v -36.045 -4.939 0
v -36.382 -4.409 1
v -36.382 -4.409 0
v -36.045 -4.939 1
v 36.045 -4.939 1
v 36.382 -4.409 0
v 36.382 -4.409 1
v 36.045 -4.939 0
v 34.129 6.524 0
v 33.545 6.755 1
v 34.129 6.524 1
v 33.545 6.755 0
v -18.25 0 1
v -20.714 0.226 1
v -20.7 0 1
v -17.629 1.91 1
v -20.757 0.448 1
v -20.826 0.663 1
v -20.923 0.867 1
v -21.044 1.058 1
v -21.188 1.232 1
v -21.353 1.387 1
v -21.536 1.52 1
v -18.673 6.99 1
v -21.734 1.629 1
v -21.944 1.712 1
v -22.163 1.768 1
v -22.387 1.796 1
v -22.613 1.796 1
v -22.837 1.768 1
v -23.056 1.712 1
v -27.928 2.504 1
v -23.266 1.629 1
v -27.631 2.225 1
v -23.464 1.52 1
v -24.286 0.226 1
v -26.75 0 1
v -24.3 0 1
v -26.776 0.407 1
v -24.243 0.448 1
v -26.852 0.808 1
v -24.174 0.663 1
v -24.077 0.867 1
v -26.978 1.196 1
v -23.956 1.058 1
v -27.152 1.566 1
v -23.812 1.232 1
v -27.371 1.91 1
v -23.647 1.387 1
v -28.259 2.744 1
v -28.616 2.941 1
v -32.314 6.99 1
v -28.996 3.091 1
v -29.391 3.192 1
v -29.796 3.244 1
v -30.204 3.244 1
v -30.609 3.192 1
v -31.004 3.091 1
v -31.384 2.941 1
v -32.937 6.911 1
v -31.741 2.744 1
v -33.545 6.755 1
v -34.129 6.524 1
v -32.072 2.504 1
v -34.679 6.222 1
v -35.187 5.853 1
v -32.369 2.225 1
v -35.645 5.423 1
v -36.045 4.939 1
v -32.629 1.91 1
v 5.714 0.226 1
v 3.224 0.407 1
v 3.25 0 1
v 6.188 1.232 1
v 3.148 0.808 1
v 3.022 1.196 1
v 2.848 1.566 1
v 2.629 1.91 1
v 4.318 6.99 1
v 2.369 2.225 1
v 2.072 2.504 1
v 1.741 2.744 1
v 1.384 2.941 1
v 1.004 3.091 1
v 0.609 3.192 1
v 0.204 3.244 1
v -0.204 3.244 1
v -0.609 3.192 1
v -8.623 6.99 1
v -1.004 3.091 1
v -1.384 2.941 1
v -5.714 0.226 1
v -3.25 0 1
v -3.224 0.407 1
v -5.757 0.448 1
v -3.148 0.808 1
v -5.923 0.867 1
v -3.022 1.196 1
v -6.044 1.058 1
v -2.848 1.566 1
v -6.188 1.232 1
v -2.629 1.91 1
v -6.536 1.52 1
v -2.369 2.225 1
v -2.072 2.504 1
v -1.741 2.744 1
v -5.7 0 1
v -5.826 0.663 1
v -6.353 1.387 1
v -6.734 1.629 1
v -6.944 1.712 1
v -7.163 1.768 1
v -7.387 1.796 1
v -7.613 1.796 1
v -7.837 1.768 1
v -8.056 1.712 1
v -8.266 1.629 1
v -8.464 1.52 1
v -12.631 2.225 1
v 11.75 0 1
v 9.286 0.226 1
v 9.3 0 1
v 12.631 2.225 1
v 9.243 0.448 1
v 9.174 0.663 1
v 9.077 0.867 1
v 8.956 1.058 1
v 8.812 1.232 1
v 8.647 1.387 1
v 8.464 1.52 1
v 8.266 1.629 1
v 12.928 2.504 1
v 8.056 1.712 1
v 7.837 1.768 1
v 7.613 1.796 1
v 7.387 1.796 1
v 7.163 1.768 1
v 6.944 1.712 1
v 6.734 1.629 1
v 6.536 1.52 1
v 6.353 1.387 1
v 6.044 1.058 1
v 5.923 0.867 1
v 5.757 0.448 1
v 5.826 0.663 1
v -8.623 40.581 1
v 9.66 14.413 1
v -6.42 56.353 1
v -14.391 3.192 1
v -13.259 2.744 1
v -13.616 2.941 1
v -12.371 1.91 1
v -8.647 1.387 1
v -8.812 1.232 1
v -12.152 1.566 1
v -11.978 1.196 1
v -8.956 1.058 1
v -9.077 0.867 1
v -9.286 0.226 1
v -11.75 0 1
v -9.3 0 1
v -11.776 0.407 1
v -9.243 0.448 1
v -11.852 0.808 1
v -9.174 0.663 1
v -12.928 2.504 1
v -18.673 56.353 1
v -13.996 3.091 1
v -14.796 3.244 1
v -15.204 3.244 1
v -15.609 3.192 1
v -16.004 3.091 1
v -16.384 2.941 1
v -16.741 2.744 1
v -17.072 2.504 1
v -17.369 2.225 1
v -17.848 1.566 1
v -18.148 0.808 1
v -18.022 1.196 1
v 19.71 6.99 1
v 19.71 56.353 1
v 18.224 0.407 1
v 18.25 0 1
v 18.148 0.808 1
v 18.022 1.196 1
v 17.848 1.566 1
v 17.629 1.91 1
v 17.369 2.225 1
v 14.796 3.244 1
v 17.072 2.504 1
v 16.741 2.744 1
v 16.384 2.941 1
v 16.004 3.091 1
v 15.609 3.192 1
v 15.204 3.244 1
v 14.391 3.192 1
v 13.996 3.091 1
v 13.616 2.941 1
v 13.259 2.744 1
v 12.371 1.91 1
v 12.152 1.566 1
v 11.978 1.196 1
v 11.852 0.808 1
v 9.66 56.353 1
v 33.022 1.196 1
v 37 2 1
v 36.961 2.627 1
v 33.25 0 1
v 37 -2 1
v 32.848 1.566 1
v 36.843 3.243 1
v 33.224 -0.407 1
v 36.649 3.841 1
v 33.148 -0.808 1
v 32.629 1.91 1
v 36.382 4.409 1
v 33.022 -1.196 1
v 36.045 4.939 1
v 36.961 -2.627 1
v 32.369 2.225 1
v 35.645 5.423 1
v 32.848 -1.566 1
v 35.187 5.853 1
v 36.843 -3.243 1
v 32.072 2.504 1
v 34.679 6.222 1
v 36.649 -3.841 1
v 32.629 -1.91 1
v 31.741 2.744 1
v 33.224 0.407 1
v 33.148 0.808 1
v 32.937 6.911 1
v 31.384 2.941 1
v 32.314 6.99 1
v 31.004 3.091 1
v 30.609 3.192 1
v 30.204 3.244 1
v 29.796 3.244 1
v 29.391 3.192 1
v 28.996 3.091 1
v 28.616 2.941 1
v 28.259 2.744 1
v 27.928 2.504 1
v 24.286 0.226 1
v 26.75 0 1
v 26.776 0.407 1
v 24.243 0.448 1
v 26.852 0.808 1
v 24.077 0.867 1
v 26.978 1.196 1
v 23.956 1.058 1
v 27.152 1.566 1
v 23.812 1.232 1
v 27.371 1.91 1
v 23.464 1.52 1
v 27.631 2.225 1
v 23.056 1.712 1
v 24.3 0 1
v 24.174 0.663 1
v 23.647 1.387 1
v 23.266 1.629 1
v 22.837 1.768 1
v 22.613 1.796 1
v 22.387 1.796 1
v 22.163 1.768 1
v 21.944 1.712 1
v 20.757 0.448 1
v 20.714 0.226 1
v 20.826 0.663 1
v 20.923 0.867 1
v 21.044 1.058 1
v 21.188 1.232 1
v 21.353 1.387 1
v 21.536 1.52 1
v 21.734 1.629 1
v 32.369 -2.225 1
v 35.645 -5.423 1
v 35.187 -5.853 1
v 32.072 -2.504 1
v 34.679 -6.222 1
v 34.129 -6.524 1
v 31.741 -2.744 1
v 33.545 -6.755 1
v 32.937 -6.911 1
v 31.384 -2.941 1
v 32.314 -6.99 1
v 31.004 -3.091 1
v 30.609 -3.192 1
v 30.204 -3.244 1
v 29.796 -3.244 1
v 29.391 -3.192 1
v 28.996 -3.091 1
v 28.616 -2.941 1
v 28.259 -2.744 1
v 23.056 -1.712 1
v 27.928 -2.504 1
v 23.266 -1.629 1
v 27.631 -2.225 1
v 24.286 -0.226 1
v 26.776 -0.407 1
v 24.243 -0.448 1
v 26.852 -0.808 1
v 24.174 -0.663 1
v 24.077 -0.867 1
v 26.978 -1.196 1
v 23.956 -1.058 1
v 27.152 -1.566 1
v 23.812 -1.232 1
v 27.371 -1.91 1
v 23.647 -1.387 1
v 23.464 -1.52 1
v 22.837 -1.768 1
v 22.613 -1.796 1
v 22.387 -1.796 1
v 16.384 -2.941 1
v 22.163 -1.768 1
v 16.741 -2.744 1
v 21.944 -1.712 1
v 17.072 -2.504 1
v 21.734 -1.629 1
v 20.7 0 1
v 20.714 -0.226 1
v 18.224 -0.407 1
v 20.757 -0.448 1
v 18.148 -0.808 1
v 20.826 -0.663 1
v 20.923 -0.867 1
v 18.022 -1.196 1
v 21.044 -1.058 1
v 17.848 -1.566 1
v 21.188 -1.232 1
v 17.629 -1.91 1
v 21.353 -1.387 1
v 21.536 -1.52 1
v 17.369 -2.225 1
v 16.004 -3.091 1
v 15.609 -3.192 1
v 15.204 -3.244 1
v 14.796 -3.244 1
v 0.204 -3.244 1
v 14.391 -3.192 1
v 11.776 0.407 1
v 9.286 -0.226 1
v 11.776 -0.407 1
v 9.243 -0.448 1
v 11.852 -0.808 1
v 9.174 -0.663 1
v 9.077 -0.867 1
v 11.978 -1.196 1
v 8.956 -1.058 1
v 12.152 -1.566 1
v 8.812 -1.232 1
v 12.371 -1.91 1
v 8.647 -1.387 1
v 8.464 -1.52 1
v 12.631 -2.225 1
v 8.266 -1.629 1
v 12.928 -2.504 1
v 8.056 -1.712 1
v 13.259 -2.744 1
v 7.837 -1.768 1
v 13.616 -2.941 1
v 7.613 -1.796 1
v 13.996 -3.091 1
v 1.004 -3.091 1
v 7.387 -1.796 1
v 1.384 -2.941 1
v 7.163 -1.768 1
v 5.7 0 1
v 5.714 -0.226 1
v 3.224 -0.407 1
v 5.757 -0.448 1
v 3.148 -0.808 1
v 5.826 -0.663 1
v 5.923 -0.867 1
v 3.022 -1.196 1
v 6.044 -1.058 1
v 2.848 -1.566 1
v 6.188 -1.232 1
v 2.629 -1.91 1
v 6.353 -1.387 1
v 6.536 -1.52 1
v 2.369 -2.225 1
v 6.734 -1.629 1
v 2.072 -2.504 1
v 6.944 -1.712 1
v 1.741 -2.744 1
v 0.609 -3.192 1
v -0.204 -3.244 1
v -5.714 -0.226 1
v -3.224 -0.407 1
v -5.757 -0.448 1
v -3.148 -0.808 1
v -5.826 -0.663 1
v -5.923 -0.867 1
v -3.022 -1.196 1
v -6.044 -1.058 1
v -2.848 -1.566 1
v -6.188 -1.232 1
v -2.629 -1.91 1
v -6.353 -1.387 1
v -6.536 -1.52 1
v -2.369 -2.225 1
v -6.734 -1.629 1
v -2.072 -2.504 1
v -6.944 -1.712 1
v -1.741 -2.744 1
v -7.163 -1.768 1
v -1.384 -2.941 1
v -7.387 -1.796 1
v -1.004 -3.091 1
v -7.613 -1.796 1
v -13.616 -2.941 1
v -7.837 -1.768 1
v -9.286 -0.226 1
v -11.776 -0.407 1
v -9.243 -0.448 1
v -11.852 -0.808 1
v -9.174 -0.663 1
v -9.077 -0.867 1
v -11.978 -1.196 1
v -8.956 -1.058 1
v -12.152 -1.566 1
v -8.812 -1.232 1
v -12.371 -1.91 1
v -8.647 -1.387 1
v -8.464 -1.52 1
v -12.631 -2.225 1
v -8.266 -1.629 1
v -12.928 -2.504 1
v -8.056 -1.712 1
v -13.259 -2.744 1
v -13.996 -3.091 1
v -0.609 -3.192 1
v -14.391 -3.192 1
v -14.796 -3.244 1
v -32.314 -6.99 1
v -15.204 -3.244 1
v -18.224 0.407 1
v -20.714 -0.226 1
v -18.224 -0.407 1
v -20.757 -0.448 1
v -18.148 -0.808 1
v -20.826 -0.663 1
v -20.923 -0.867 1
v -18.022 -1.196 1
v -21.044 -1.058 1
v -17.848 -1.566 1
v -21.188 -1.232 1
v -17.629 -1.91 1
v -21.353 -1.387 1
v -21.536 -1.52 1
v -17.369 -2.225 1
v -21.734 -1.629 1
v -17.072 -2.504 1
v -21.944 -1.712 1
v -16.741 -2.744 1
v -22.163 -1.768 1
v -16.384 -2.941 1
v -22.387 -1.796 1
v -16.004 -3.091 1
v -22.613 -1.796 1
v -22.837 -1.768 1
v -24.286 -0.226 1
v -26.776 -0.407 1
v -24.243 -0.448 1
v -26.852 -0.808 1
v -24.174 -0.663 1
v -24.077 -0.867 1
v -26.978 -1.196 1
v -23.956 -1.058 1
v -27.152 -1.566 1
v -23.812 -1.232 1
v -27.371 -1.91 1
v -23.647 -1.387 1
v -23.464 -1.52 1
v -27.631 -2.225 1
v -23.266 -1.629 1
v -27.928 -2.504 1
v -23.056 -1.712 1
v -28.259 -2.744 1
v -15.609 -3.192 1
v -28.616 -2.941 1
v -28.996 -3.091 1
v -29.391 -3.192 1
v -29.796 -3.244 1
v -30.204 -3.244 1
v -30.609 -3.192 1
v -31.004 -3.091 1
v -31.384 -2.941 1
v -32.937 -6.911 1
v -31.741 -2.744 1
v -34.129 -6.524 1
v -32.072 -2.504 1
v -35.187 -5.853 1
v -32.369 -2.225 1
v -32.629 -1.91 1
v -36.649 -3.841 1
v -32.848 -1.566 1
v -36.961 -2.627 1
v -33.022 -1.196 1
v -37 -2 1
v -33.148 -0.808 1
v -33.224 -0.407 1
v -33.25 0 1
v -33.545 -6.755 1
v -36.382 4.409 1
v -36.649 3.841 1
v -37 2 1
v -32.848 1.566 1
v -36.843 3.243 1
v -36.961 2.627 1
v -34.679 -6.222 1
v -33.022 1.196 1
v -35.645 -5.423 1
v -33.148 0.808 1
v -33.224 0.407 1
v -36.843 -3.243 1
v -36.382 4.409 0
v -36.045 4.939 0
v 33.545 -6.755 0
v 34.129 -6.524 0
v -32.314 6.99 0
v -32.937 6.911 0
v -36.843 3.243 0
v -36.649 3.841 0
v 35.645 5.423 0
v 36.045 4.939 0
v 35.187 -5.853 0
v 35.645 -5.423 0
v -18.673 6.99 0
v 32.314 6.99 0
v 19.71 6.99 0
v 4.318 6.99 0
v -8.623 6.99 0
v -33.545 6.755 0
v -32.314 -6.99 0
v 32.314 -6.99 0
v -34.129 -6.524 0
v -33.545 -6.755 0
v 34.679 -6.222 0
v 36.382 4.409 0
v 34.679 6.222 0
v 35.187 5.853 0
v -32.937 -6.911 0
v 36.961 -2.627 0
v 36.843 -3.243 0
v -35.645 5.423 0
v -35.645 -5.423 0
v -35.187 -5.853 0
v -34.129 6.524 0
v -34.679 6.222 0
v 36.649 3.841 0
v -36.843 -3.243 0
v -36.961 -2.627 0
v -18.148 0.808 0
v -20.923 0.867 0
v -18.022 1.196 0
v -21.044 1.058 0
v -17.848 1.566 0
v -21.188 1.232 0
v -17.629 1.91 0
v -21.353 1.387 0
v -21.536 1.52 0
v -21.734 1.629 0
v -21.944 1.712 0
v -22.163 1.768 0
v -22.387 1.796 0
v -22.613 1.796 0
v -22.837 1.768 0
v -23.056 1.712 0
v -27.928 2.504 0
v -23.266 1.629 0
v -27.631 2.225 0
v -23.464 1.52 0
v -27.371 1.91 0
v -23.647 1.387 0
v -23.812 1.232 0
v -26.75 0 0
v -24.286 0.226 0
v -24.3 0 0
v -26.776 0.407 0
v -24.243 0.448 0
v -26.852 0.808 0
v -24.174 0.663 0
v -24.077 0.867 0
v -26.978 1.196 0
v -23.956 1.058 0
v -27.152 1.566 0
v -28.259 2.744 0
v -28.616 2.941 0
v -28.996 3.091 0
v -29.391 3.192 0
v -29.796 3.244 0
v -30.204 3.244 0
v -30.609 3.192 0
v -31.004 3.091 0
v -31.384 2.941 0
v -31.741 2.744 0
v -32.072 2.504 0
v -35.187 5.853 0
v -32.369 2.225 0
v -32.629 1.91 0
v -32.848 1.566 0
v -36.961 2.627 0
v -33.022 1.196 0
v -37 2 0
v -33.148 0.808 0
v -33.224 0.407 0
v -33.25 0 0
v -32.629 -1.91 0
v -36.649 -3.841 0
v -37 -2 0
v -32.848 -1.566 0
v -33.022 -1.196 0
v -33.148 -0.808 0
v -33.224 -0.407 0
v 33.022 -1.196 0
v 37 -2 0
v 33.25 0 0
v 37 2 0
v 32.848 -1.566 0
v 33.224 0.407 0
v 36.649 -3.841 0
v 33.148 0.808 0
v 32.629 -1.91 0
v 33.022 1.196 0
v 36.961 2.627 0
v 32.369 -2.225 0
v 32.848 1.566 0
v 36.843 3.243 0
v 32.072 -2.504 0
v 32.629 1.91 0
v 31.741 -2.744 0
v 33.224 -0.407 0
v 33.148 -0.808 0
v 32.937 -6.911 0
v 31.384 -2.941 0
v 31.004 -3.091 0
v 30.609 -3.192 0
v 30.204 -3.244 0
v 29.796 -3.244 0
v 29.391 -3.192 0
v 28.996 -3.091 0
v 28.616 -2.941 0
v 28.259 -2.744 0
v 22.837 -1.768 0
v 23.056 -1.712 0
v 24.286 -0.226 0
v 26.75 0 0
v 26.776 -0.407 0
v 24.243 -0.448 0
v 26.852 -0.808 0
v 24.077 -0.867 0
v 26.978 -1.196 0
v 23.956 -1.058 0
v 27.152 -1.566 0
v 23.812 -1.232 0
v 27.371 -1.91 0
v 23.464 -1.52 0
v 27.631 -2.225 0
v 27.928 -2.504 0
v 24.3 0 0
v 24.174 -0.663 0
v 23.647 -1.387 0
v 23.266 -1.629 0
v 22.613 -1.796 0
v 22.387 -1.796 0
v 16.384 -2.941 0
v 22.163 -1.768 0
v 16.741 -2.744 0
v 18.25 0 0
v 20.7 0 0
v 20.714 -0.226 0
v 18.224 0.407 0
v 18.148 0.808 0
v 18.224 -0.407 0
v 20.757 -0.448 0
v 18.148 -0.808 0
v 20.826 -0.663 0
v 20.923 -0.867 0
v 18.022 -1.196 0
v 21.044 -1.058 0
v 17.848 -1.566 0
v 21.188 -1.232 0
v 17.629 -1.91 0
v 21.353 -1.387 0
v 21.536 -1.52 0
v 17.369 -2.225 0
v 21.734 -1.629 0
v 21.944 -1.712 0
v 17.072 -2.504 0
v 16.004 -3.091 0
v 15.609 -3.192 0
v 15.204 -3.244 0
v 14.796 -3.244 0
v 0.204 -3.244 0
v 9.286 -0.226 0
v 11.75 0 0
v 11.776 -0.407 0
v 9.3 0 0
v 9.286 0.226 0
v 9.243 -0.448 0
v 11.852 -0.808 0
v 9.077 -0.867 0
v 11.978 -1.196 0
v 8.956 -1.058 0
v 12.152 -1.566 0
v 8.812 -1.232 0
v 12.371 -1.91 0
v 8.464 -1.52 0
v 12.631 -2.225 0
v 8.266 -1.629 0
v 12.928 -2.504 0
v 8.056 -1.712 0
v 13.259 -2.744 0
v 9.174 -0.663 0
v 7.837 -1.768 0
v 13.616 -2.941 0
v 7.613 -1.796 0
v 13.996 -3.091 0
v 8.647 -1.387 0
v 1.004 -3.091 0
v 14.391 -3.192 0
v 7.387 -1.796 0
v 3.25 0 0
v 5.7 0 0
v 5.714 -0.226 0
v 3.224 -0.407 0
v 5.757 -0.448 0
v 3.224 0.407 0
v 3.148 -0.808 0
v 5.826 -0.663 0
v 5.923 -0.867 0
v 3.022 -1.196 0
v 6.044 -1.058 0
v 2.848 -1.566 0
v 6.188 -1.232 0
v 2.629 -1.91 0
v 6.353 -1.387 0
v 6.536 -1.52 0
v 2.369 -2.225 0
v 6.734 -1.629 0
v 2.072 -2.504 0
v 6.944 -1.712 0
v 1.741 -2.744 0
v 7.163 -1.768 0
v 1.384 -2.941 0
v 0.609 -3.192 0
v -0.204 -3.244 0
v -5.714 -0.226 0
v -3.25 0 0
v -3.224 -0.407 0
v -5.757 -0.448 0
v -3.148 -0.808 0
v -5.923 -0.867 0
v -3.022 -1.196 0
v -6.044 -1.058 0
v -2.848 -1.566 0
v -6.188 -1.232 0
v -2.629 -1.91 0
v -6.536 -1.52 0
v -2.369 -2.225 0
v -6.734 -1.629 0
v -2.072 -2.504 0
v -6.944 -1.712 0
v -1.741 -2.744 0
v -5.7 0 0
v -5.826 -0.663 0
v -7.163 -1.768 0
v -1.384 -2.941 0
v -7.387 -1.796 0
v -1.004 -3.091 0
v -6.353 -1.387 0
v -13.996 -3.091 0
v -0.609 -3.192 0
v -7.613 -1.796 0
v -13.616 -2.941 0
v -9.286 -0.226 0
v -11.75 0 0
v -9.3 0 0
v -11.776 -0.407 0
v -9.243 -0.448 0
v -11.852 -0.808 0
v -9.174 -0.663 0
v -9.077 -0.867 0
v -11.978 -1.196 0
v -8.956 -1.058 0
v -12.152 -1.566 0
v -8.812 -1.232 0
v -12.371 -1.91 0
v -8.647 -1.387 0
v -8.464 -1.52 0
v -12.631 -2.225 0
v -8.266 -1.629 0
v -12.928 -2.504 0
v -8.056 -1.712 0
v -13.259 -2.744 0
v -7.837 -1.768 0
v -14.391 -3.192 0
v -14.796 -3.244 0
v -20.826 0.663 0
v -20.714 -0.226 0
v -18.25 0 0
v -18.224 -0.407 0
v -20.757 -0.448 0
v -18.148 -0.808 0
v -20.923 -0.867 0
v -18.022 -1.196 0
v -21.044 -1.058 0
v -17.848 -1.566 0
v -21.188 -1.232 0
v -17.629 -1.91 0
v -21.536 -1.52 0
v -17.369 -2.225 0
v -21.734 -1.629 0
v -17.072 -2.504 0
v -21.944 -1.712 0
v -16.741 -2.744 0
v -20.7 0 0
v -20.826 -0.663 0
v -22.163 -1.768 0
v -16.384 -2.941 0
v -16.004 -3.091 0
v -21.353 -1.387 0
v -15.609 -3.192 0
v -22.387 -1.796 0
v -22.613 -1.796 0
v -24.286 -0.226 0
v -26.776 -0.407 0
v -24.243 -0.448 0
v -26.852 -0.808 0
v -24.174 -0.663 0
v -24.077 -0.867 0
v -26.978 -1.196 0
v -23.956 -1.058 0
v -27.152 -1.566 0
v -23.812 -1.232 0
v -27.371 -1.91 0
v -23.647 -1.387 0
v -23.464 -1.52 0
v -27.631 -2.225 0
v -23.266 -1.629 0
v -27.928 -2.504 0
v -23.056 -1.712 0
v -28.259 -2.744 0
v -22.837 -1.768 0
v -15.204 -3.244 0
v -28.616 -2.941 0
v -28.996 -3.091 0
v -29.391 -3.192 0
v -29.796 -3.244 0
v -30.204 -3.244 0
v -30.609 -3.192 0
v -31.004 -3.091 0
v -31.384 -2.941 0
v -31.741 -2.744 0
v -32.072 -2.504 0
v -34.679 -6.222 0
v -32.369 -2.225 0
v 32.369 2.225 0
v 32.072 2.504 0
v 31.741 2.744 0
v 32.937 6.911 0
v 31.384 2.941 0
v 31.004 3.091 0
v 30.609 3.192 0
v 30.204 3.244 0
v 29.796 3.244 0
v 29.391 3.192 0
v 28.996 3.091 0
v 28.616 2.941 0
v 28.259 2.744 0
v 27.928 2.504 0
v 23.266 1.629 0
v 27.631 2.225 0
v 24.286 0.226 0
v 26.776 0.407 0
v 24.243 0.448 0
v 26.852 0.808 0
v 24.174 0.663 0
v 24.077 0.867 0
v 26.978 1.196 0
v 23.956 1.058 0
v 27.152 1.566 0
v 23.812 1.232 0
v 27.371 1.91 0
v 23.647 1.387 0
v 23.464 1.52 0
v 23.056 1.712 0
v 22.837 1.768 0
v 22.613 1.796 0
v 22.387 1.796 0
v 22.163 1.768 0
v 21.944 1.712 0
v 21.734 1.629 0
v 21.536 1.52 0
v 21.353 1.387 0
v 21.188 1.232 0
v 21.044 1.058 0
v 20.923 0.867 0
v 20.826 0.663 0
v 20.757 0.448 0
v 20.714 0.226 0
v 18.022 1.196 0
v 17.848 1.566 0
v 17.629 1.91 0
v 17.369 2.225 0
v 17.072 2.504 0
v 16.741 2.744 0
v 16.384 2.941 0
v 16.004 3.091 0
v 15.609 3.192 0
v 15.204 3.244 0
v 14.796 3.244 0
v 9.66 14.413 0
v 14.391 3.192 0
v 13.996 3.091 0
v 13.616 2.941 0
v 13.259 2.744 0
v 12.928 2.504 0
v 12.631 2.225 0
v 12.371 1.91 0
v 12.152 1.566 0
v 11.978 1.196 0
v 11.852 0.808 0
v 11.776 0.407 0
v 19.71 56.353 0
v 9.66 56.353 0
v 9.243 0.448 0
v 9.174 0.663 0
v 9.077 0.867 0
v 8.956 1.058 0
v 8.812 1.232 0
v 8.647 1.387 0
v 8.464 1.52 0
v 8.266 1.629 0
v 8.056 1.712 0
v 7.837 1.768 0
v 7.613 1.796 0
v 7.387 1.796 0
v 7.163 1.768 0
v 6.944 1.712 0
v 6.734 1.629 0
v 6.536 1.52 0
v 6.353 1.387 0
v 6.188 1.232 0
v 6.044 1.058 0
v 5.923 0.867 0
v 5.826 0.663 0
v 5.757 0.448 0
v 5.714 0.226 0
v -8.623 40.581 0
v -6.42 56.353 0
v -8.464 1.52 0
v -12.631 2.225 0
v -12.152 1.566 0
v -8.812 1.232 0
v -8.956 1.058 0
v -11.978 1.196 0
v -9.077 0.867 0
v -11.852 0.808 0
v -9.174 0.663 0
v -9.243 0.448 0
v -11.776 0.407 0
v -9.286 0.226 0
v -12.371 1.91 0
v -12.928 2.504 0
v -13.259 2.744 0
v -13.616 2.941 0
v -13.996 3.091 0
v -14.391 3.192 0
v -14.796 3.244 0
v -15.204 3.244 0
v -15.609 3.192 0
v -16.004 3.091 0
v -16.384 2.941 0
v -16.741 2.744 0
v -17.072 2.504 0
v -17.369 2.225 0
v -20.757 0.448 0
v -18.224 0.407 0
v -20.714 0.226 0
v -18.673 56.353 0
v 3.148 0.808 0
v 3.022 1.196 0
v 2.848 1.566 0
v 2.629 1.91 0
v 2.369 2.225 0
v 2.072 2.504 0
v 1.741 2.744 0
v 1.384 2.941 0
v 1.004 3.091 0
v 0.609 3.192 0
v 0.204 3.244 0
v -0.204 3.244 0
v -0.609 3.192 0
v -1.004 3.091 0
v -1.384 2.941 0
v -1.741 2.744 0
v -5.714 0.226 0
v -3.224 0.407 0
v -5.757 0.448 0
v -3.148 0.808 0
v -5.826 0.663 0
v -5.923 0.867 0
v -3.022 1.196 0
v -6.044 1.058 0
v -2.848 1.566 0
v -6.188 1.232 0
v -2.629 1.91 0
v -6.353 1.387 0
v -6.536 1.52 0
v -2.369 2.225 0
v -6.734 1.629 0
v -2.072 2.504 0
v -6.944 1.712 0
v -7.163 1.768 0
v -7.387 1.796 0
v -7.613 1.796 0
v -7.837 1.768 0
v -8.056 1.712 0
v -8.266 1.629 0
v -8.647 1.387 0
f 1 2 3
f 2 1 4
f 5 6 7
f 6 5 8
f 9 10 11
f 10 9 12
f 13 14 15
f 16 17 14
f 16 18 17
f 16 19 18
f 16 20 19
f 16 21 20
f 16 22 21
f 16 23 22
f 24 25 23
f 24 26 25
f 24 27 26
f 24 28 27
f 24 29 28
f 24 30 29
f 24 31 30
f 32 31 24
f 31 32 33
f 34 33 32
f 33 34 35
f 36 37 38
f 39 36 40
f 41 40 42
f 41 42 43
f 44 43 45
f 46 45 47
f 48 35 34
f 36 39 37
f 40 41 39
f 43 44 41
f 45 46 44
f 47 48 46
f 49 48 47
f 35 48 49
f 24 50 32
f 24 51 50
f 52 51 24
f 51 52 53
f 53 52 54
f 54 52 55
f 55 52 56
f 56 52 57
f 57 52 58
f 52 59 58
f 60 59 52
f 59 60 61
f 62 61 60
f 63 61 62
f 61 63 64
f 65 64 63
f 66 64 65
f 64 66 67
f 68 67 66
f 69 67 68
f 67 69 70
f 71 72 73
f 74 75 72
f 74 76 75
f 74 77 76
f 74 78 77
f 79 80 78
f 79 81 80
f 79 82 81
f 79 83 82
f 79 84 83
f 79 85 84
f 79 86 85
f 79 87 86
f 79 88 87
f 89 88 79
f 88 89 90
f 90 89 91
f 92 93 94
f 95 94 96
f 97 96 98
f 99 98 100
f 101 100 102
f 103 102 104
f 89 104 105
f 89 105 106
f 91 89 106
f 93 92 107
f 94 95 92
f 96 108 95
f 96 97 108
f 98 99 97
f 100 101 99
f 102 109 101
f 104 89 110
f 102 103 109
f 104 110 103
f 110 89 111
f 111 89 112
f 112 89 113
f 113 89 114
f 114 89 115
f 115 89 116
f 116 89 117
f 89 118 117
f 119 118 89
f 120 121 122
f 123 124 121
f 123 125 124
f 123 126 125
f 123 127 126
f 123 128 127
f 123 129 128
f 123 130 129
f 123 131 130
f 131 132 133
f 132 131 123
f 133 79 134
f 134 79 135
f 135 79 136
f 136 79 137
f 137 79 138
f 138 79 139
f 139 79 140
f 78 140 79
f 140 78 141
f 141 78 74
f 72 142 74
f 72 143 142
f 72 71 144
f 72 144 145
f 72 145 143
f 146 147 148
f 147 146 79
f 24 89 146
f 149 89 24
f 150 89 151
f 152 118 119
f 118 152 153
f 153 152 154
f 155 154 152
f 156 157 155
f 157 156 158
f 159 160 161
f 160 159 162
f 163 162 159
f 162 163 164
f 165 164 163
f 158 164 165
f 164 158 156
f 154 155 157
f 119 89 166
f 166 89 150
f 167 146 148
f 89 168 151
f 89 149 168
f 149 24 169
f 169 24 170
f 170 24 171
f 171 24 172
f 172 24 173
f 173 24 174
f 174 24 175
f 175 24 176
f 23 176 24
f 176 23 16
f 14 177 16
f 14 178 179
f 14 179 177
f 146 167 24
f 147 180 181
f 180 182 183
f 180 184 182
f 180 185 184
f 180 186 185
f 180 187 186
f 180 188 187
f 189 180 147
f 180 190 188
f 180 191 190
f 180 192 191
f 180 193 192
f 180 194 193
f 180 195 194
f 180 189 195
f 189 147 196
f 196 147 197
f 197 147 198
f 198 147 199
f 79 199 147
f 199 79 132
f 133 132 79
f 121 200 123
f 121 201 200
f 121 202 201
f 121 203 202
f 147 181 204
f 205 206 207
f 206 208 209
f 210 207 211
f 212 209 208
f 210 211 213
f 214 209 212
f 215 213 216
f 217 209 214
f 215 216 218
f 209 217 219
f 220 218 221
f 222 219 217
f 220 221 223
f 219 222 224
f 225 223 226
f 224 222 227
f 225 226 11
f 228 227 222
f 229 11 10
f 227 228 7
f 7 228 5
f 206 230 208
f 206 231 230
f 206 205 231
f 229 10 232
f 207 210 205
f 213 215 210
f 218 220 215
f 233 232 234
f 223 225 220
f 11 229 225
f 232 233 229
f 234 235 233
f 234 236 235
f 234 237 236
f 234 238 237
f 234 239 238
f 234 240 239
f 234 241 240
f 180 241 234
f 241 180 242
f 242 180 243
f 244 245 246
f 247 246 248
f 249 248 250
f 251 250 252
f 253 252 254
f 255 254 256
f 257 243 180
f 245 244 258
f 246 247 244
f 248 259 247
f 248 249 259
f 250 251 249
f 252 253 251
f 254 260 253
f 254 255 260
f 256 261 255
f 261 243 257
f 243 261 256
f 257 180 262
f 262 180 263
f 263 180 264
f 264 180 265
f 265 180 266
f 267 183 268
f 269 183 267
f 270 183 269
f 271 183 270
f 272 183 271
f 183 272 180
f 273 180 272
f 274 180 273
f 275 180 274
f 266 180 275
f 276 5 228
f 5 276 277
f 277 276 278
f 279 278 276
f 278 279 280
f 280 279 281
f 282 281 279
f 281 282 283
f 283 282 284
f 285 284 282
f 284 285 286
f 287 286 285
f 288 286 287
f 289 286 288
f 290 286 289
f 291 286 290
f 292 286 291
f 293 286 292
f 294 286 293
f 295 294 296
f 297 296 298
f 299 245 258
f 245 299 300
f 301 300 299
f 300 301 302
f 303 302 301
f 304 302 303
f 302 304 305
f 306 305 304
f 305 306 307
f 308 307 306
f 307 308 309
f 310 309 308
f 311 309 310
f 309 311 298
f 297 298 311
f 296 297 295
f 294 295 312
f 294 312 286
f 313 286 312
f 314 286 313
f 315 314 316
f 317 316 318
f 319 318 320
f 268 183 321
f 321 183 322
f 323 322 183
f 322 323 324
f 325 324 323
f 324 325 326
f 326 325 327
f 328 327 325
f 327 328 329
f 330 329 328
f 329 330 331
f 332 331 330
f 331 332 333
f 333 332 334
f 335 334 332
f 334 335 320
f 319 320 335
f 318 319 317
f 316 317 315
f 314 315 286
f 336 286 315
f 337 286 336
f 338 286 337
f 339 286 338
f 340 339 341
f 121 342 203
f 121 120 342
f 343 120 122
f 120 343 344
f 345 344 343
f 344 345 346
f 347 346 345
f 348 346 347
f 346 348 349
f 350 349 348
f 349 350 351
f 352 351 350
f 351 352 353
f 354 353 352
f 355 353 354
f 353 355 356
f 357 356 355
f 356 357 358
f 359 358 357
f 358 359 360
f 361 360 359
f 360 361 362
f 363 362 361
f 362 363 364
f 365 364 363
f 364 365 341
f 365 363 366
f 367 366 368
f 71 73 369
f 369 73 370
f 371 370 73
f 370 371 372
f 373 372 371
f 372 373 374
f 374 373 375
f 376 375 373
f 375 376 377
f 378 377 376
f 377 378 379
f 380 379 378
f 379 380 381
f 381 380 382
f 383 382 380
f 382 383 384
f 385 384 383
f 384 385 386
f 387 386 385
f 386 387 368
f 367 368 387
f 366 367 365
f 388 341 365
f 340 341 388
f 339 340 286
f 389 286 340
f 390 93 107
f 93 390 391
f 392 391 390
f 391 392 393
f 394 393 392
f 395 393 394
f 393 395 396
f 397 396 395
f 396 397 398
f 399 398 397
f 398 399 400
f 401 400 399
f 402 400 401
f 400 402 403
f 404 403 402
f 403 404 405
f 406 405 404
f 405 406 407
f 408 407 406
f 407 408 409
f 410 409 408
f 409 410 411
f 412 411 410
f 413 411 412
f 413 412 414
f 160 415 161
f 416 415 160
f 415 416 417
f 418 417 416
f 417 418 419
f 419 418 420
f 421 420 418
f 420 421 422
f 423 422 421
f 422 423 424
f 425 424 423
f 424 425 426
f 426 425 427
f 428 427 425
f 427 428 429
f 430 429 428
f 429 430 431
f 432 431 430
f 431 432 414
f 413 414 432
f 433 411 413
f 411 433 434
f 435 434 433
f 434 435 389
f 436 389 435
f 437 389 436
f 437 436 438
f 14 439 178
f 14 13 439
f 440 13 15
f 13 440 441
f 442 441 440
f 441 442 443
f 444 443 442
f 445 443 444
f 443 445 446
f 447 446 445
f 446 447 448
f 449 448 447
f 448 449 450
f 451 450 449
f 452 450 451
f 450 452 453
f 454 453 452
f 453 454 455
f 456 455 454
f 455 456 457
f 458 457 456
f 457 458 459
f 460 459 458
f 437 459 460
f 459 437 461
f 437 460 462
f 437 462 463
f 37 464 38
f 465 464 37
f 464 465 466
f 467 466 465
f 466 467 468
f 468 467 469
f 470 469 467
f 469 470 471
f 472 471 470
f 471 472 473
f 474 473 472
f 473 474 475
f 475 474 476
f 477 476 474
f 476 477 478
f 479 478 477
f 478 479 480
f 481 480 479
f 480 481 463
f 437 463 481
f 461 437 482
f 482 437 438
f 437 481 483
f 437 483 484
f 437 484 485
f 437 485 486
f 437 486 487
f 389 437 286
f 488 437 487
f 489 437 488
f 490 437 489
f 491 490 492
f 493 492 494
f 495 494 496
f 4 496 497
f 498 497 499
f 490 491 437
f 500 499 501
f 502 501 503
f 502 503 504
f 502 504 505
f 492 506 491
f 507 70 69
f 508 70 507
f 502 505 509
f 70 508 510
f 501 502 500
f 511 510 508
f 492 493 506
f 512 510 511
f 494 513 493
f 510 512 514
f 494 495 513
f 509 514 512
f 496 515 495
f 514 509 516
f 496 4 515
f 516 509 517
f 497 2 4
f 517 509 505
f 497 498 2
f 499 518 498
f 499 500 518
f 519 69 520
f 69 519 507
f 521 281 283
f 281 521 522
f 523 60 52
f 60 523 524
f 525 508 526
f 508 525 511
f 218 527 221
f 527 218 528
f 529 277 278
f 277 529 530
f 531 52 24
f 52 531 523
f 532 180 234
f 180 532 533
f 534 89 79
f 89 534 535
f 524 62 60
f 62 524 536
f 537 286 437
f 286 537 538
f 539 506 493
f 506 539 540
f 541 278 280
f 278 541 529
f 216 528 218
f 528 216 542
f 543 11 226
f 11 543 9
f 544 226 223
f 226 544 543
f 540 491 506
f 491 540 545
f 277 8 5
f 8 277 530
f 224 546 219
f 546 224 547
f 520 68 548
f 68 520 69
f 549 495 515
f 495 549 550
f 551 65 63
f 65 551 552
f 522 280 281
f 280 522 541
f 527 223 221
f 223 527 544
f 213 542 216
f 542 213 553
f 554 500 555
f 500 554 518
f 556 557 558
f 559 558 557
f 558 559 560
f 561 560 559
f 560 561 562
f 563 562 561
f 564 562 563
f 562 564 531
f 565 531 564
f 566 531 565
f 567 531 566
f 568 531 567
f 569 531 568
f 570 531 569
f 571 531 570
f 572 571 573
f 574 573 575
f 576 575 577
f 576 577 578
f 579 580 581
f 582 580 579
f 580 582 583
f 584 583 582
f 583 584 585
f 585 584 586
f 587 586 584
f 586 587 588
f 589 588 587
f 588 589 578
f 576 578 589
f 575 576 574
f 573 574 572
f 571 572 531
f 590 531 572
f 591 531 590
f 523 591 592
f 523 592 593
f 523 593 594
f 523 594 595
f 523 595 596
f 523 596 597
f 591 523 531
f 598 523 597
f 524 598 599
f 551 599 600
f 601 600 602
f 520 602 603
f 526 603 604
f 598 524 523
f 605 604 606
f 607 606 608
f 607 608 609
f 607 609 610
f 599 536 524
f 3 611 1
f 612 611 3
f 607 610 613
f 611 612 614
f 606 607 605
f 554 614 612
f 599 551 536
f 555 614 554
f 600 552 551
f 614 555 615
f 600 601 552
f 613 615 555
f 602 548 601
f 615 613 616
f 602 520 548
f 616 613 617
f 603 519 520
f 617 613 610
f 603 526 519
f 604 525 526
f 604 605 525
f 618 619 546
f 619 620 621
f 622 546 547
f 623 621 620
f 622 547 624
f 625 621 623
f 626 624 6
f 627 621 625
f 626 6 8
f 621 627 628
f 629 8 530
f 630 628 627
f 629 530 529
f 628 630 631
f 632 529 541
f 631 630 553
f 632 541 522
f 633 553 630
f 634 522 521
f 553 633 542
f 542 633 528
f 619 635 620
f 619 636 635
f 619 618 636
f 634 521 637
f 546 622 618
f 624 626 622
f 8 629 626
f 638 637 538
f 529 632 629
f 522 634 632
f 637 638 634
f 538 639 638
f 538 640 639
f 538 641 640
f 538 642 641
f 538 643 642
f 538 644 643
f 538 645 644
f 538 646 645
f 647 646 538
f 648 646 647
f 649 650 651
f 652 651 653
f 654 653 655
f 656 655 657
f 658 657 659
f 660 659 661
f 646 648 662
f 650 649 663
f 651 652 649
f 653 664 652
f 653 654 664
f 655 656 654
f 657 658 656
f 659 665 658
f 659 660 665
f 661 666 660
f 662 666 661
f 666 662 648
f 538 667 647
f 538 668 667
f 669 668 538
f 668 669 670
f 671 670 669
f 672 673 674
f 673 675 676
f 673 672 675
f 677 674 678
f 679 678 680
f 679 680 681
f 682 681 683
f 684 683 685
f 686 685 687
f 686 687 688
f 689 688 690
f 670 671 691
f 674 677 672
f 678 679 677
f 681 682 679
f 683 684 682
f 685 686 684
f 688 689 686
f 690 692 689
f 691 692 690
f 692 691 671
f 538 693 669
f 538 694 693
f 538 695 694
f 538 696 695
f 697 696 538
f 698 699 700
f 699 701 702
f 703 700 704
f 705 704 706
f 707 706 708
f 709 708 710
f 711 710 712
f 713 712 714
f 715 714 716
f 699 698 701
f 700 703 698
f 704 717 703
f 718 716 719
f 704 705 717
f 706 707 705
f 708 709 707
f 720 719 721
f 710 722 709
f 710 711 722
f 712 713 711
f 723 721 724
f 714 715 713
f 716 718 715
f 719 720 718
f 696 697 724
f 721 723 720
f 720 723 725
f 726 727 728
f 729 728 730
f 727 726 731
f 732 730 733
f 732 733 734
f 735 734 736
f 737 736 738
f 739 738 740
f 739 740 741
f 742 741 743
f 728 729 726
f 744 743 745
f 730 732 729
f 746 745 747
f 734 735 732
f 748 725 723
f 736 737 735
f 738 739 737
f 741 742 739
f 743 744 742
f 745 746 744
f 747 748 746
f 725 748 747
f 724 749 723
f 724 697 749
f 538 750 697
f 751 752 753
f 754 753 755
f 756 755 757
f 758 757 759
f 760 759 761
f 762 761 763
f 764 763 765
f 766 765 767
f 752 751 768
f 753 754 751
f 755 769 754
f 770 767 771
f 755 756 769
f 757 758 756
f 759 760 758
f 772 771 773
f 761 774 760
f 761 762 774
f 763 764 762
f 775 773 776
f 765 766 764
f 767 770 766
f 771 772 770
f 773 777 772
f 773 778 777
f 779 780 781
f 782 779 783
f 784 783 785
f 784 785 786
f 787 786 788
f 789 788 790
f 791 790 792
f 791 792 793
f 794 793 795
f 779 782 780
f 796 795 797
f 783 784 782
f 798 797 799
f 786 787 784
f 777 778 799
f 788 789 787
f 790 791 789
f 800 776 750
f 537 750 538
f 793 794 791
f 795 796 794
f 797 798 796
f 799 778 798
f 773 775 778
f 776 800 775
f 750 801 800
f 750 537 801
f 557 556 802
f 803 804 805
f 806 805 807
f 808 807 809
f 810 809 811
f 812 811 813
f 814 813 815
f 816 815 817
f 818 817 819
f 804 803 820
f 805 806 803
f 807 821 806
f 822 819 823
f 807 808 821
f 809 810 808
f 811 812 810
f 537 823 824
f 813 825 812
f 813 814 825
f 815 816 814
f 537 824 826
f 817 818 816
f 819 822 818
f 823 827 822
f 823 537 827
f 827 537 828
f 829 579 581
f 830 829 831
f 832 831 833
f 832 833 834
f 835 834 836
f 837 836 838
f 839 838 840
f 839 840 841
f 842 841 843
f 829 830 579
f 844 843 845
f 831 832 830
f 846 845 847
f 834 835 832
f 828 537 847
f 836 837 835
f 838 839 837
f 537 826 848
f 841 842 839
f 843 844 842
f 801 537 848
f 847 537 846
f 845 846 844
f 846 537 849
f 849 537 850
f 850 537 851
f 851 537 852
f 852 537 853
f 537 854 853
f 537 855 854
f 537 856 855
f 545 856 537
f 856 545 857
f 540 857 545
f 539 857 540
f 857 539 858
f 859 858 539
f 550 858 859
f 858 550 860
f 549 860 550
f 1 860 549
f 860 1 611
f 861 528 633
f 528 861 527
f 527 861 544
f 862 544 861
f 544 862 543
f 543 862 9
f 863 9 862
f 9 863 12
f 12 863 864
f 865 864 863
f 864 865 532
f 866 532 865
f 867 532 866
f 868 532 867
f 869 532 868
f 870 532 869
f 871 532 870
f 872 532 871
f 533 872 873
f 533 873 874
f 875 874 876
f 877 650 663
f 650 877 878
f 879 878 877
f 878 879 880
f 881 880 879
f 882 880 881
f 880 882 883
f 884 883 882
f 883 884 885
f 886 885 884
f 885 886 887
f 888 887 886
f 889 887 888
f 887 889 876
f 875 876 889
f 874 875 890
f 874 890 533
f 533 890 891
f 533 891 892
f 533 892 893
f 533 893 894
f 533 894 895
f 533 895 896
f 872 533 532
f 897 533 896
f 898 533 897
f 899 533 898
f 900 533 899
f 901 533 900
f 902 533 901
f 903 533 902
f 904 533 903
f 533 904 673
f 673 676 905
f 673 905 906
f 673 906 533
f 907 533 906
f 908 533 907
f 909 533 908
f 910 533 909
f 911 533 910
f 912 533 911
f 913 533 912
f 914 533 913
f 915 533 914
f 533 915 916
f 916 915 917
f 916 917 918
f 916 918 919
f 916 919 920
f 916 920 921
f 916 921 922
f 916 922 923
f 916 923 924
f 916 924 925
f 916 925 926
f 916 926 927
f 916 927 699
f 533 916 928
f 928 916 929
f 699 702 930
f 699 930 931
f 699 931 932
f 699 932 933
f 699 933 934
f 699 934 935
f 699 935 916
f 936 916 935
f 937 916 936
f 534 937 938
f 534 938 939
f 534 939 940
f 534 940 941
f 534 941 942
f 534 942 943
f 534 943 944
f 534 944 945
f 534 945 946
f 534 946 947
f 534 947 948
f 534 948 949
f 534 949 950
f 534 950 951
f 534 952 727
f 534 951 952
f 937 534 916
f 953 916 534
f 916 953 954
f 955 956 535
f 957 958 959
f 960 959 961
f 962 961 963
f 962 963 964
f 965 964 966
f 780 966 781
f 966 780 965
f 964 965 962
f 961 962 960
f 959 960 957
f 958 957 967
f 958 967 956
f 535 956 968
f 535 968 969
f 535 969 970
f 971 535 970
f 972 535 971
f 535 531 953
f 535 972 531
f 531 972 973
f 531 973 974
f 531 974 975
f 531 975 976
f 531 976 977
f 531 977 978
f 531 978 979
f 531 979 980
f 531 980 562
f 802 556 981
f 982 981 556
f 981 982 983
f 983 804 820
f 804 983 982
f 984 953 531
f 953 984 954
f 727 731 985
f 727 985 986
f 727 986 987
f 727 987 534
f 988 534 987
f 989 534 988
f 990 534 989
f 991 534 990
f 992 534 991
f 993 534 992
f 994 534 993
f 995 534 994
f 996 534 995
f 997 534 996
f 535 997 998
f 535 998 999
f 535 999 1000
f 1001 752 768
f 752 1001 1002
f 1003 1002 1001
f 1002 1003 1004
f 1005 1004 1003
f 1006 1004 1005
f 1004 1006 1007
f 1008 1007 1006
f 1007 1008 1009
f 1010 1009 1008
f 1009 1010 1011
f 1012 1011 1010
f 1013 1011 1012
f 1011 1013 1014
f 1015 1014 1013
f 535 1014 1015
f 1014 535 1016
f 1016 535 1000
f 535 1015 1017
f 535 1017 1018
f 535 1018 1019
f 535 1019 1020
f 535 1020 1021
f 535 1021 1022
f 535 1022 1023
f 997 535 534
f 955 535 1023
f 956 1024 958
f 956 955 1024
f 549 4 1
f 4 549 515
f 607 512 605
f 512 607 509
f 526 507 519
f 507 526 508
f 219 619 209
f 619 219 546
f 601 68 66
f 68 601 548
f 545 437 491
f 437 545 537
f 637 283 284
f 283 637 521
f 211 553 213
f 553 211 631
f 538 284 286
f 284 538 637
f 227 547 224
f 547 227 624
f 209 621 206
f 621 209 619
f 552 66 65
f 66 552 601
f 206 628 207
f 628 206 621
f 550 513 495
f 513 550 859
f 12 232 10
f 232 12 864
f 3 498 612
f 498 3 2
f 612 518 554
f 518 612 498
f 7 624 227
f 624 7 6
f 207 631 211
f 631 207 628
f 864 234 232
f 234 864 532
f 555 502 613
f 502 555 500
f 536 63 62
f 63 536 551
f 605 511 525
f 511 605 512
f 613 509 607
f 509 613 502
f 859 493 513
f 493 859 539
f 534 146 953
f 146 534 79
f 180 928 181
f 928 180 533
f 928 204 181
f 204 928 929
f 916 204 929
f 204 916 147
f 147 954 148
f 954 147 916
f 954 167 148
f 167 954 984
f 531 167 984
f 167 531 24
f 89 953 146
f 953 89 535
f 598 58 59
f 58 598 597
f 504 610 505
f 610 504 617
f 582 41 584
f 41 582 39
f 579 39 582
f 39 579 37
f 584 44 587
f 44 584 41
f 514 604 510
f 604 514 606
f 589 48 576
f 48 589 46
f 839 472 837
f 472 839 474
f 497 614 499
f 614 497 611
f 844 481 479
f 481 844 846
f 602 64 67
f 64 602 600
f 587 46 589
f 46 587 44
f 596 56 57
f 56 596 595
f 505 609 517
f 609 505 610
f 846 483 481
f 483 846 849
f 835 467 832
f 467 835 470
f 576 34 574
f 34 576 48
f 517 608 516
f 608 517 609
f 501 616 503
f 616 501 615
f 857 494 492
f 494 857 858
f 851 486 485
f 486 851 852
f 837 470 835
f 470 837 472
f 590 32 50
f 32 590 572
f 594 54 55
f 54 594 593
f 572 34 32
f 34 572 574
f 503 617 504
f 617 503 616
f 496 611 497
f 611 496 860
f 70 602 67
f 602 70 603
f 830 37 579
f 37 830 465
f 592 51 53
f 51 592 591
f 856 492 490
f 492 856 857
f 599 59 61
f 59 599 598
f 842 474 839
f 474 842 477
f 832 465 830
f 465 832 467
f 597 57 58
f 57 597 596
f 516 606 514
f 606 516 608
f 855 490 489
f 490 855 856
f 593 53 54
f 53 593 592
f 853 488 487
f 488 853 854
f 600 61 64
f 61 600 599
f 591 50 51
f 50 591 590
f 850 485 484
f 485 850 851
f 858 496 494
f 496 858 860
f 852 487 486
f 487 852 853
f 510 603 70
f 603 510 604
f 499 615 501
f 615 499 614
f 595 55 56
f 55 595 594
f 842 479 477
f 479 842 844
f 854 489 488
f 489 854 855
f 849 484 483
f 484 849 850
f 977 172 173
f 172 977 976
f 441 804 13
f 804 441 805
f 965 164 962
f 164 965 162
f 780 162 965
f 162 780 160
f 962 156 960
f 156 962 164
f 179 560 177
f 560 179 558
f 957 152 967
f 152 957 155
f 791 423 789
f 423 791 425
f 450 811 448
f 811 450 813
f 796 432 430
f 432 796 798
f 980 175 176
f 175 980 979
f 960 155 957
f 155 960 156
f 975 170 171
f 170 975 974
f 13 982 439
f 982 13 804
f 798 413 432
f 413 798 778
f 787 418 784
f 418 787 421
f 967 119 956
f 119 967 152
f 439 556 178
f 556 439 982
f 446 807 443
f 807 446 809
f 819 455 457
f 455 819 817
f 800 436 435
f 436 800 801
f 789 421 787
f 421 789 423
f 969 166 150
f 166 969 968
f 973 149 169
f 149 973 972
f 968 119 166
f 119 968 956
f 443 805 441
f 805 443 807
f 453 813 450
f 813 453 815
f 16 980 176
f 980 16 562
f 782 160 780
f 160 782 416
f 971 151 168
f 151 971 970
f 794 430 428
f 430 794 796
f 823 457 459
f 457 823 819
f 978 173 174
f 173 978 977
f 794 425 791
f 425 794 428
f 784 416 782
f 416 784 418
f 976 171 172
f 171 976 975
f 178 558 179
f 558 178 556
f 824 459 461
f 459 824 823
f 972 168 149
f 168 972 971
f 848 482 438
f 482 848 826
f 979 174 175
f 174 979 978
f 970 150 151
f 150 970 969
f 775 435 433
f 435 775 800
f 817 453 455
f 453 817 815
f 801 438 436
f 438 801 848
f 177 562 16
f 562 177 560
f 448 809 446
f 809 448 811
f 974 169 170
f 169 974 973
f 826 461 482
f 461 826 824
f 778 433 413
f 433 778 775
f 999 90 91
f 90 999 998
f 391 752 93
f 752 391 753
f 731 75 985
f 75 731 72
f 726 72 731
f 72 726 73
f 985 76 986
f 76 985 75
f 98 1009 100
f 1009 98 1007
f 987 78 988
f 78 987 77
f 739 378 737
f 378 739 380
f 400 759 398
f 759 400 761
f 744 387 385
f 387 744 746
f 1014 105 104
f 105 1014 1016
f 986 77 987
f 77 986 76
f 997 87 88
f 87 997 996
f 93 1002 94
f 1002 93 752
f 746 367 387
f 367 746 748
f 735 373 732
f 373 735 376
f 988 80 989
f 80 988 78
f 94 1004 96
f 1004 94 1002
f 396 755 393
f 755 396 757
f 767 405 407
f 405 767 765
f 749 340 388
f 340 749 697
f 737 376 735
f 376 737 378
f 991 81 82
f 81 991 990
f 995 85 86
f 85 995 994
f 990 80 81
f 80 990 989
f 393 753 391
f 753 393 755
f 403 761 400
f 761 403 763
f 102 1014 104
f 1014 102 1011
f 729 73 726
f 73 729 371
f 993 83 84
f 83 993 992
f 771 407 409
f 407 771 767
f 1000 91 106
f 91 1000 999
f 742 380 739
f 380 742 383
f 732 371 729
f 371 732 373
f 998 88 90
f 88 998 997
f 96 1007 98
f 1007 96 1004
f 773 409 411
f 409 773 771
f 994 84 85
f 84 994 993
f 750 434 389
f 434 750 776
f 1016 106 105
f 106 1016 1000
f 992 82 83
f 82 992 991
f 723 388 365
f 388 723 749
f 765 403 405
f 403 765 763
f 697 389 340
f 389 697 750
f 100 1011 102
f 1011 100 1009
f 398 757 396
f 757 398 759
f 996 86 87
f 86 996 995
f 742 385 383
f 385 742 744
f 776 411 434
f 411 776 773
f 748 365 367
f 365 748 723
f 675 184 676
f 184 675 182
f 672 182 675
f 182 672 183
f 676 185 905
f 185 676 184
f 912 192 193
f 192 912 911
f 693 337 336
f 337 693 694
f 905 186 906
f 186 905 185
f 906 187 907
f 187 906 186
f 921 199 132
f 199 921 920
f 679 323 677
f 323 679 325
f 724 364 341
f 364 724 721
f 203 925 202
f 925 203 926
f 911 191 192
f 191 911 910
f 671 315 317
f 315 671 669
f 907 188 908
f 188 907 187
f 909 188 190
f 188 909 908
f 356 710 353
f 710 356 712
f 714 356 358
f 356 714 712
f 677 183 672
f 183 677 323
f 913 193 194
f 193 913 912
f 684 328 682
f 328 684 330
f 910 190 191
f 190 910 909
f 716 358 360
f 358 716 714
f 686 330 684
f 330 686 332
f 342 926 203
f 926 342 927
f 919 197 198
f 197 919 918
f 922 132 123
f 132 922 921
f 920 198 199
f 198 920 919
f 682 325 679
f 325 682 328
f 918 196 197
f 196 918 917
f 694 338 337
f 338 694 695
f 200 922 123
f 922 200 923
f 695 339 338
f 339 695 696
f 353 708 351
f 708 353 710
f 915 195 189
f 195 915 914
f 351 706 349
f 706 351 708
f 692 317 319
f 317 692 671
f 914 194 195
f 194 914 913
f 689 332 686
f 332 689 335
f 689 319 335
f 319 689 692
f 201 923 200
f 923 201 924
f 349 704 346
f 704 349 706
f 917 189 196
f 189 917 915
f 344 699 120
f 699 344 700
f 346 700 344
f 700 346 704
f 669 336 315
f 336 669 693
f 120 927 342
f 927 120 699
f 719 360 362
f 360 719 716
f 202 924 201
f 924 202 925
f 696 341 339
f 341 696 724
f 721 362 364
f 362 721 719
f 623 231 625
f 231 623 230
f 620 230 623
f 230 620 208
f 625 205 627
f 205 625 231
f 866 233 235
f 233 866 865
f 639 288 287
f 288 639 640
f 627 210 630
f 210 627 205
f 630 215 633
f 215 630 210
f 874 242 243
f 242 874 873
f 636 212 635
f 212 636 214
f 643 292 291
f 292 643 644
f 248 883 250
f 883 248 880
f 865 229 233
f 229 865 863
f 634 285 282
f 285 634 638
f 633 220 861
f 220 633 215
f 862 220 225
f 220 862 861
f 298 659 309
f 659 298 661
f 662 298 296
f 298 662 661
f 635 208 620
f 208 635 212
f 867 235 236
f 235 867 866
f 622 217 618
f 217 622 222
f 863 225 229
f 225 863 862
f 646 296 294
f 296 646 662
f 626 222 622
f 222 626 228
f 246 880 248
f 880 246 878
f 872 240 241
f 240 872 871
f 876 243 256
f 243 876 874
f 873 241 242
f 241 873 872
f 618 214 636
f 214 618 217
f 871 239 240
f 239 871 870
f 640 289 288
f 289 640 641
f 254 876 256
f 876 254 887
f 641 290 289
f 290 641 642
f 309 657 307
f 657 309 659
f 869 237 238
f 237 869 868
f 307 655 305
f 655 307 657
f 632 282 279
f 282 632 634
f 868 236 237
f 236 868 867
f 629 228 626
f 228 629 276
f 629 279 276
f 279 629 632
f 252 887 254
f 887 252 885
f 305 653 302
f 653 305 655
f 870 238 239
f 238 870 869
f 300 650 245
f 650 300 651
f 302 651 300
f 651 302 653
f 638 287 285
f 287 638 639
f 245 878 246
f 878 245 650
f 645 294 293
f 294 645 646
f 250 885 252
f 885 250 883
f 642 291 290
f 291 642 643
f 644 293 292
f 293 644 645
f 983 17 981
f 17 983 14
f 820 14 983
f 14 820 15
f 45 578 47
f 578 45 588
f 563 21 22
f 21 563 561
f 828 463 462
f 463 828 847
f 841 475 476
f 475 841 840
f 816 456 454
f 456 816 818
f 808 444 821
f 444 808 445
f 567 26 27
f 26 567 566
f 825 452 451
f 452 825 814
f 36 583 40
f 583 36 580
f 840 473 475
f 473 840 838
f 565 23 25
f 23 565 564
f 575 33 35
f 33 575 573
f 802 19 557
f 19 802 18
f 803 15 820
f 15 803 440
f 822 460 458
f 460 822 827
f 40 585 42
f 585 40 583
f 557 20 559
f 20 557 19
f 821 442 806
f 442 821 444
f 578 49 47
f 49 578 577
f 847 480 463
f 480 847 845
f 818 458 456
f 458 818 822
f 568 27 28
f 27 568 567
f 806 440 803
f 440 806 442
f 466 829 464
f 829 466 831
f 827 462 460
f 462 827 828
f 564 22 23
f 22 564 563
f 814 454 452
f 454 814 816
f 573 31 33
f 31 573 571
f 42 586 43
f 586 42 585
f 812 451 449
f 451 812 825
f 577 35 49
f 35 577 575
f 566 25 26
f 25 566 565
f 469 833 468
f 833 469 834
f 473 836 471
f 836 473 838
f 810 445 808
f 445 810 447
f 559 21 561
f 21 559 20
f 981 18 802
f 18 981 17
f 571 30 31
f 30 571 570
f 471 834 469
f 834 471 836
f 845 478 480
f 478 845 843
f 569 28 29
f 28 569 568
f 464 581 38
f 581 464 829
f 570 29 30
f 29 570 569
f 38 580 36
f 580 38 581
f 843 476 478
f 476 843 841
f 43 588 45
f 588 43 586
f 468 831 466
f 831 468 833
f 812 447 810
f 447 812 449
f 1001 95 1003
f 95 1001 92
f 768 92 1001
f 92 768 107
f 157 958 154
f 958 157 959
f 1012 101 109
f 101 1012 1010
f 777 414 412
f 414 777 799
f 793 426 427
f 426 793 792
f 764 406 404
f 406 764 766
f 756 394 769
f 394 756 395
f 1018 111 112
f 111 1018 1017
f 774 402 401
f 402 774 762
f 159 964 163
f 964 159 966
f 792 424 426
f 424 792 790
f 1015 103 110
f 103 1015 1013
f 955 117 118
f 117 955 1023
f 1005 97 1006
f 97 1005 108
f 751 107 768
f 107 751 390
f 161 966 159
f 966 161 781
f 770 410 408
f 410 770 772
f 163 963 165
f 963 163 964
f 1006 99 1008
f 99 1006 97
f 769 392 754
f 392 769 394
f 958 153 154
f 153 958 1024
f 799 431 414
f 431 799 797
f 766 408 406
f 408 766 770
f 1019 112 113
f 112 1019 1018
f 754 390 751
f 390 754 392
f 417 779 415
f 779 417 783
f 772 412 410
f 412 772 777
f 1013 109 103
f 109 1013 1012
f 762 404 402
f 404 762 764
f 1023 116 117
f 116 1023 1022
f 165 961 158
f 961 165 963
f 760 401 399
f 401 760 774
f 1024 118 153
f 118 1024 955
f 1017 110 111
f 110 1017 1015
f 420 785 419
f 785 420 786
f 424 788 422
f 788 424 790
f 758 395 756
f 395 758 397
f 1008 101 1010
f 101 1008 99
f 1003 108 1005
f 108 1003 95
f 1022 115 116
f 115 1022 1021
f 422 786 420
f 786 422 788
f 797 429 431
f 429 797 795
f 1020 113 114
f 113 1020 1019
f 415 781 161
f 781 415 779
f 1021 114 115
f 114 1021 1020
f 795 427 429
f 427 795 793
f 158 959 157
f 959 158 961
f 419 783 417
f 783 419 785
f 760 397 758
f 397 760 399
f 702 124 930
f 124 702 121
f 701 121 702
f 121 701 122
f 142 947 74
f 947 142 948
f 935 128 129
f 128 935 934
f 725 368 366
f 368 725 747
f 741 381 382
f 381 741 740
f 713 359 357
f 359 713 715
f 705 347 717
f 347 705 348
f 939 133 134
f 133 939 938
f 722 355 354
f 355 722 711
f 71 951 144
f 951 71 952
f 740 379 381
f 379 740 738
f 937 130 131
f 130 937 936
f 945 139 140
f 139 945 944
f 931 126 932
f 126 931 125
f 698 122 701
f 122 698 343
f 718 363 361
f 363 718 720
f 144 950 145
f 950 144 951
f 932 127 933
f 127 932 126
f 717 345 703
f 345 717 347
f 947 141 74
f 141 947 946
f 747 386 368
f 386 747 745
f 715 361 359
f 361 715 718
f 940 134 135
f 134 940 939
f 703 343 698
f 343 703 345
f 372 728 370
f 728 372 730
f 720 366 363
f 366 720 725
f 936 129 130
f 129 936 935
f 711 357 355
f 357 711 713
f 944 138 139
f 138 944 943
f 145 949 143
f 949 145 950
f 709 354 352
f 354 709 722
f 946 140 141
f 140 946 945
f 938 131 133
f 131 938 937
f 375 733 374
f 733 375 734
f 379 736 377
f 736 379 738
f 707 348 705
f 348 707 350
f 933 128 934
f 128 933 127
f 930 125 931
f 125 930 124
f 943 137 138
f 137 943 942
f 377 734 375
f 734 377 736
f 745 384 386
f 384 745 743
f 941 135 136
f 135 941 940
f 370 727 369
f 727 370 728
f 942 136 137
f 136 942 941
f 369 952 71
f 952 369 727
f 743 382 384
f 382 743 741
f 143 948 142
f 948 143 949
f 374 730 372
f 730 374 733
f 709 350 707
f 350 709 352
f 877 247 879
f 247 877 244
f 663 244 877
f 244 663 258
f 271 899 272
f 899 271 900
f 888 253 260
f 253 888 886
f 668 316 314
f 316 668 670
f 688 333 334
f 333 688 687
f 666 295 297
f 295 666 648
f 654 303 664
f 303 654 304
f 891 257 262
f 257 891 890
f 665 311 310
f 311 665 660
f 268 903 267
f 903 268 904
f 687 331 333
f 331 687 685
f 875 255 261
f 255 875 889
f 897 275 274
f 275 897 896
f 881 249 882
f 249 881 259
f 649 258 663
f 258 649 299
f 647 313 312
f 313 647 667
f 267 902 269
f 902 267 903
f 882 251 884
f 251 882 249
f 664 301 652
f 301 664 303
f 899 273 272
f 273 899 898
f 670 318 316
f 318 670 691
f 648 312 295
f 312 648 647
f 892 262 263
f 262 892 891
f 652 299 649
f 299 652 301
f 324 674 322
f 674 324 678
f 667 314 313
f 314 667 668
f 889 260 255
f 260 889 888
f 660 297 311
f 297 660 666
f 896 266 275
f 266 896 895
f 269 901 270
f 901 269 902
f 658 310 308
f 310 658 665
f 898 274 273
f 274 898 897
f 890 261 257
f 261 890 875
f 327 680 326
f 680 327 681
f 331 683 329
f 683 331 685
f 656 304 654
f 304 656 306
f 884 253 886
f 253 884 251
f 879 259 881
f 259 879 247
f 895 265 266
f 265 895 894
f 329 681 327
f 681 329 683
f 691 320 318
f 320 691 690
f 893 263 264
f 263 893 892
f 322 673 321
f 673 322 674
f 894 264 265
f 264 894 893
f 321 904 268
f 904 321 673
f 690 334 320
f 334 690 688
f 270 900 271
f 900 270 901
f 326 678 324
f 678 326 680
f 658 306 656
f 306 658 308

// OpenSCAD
$fn = 50;


difference() {
	union() {
		hull() {
			translate(v = [-32.0000000000, 2.0000000000, 0]) {
				cylinder(h = 1, r = 5);
			}
			translate(v = [32.0000000000, 2.0000000000, 0]) {
				cylinder(h = 1, r = 5);
			}
			translate(v = [-32.0000000000, -2.0000000000, 0]) {
				cylinder(h = 1, r = 5);
			}
			translate(v = [32.0000000000, -2.0000000000, 0]) {
				cylinder(h = 1, r = 5);
			}
		}
		translate(v = [0, 55, 0]) {
			linear_extrude(height = 1) {
				text(font = "DejaVu Sans Mono:style=Bold", halign = "center", size = 57.0000000000, text = "N", valign = "top");
			}
		}
	}
	union() {
		translate(v = [-30.0000000000, 0.0000000000, 0]) {
			translate(v = [0, 0, -100]) {
				cylinder(h = 200, r = 3.2500000000);
			}
		}
		translate(v = [-15.0000000000, 0.0000000000, 0]) {
			translate(v = [0, 0, -100]) {
				cylinder(h = 200, r = 3.2500000000);
			}
		}
		translate(v = [0, 0, -100]) {
			cylinder(h = 200, r = 3.2500000000);
		}
		translate(v = [15.0000000000, 0.0000000000, 0]) {
			translate(v = [0, 0, -100]) {
				cylinder(h = 200, r = 3.2500000000);
			}
		}
		translate(v = [30.0000000000, 0.0000000000, 0]) {
			translate(v = [0, 0, -100]) {
				cylinder(h = 200, r = 3.2500000000);
			}
		}
		translate(v = [-30.0000000000, 0.0000000000, 0]) {
			translate(v = [0, 0, -100]) {
				cylinder(h = 200, r = 1.8000000000);
			}
		}
		translate(v = [-22.5000000000, 0.0000000000, 0]) {
			translate(v = [0, 0, -100]) {
				cylinder(h = 200, r = 1.8000000000);
			}
		}
		translate(v = [-15.0000000000, 0.0000000000, 0]) {
			translate(v = [0, 0, -100]) {
				cylinder(h = 200, r = 1.8000000000);
			}
		}
		translate(v = [-7.5000000000, 0.0000000000, 0]) {
			translate(v = [0, 0, -100]) {
				cylinder(h = 200, r = 1.8000000000);
			}
		}
		translate(v = [0, 0, -100]) {
			cylinder(h = 200, r = 1.8000000000);
		}
		translate(v = [7.5000000000, 0.0000000000, 0]) {
			translate(v = [0, 0, -100]) {
				cylinder(h = 200, r = 1.8000000000);
			}
		}
		translate(v = [15.0000000000, 0.0000000000, 0]) {
			translate(v = [0, 0, -100]) {
				cylinder(h = 200, r = 1.8000000000);
			}
		}
		translate(v = [22.5000000000, 0.0000000000, 0]) {
			translate(v = [0, 0, -100]) {
				cylinder(h = 200, r = 1.8000000000);
			}
		}
		translate(v = [30.0000000000, 0.0000000000, 0]) {
			translate(v = [0, 0, -100]) {
				cylinder(h = 200, r = 1.8000000000);
			}
		}
	}
}
